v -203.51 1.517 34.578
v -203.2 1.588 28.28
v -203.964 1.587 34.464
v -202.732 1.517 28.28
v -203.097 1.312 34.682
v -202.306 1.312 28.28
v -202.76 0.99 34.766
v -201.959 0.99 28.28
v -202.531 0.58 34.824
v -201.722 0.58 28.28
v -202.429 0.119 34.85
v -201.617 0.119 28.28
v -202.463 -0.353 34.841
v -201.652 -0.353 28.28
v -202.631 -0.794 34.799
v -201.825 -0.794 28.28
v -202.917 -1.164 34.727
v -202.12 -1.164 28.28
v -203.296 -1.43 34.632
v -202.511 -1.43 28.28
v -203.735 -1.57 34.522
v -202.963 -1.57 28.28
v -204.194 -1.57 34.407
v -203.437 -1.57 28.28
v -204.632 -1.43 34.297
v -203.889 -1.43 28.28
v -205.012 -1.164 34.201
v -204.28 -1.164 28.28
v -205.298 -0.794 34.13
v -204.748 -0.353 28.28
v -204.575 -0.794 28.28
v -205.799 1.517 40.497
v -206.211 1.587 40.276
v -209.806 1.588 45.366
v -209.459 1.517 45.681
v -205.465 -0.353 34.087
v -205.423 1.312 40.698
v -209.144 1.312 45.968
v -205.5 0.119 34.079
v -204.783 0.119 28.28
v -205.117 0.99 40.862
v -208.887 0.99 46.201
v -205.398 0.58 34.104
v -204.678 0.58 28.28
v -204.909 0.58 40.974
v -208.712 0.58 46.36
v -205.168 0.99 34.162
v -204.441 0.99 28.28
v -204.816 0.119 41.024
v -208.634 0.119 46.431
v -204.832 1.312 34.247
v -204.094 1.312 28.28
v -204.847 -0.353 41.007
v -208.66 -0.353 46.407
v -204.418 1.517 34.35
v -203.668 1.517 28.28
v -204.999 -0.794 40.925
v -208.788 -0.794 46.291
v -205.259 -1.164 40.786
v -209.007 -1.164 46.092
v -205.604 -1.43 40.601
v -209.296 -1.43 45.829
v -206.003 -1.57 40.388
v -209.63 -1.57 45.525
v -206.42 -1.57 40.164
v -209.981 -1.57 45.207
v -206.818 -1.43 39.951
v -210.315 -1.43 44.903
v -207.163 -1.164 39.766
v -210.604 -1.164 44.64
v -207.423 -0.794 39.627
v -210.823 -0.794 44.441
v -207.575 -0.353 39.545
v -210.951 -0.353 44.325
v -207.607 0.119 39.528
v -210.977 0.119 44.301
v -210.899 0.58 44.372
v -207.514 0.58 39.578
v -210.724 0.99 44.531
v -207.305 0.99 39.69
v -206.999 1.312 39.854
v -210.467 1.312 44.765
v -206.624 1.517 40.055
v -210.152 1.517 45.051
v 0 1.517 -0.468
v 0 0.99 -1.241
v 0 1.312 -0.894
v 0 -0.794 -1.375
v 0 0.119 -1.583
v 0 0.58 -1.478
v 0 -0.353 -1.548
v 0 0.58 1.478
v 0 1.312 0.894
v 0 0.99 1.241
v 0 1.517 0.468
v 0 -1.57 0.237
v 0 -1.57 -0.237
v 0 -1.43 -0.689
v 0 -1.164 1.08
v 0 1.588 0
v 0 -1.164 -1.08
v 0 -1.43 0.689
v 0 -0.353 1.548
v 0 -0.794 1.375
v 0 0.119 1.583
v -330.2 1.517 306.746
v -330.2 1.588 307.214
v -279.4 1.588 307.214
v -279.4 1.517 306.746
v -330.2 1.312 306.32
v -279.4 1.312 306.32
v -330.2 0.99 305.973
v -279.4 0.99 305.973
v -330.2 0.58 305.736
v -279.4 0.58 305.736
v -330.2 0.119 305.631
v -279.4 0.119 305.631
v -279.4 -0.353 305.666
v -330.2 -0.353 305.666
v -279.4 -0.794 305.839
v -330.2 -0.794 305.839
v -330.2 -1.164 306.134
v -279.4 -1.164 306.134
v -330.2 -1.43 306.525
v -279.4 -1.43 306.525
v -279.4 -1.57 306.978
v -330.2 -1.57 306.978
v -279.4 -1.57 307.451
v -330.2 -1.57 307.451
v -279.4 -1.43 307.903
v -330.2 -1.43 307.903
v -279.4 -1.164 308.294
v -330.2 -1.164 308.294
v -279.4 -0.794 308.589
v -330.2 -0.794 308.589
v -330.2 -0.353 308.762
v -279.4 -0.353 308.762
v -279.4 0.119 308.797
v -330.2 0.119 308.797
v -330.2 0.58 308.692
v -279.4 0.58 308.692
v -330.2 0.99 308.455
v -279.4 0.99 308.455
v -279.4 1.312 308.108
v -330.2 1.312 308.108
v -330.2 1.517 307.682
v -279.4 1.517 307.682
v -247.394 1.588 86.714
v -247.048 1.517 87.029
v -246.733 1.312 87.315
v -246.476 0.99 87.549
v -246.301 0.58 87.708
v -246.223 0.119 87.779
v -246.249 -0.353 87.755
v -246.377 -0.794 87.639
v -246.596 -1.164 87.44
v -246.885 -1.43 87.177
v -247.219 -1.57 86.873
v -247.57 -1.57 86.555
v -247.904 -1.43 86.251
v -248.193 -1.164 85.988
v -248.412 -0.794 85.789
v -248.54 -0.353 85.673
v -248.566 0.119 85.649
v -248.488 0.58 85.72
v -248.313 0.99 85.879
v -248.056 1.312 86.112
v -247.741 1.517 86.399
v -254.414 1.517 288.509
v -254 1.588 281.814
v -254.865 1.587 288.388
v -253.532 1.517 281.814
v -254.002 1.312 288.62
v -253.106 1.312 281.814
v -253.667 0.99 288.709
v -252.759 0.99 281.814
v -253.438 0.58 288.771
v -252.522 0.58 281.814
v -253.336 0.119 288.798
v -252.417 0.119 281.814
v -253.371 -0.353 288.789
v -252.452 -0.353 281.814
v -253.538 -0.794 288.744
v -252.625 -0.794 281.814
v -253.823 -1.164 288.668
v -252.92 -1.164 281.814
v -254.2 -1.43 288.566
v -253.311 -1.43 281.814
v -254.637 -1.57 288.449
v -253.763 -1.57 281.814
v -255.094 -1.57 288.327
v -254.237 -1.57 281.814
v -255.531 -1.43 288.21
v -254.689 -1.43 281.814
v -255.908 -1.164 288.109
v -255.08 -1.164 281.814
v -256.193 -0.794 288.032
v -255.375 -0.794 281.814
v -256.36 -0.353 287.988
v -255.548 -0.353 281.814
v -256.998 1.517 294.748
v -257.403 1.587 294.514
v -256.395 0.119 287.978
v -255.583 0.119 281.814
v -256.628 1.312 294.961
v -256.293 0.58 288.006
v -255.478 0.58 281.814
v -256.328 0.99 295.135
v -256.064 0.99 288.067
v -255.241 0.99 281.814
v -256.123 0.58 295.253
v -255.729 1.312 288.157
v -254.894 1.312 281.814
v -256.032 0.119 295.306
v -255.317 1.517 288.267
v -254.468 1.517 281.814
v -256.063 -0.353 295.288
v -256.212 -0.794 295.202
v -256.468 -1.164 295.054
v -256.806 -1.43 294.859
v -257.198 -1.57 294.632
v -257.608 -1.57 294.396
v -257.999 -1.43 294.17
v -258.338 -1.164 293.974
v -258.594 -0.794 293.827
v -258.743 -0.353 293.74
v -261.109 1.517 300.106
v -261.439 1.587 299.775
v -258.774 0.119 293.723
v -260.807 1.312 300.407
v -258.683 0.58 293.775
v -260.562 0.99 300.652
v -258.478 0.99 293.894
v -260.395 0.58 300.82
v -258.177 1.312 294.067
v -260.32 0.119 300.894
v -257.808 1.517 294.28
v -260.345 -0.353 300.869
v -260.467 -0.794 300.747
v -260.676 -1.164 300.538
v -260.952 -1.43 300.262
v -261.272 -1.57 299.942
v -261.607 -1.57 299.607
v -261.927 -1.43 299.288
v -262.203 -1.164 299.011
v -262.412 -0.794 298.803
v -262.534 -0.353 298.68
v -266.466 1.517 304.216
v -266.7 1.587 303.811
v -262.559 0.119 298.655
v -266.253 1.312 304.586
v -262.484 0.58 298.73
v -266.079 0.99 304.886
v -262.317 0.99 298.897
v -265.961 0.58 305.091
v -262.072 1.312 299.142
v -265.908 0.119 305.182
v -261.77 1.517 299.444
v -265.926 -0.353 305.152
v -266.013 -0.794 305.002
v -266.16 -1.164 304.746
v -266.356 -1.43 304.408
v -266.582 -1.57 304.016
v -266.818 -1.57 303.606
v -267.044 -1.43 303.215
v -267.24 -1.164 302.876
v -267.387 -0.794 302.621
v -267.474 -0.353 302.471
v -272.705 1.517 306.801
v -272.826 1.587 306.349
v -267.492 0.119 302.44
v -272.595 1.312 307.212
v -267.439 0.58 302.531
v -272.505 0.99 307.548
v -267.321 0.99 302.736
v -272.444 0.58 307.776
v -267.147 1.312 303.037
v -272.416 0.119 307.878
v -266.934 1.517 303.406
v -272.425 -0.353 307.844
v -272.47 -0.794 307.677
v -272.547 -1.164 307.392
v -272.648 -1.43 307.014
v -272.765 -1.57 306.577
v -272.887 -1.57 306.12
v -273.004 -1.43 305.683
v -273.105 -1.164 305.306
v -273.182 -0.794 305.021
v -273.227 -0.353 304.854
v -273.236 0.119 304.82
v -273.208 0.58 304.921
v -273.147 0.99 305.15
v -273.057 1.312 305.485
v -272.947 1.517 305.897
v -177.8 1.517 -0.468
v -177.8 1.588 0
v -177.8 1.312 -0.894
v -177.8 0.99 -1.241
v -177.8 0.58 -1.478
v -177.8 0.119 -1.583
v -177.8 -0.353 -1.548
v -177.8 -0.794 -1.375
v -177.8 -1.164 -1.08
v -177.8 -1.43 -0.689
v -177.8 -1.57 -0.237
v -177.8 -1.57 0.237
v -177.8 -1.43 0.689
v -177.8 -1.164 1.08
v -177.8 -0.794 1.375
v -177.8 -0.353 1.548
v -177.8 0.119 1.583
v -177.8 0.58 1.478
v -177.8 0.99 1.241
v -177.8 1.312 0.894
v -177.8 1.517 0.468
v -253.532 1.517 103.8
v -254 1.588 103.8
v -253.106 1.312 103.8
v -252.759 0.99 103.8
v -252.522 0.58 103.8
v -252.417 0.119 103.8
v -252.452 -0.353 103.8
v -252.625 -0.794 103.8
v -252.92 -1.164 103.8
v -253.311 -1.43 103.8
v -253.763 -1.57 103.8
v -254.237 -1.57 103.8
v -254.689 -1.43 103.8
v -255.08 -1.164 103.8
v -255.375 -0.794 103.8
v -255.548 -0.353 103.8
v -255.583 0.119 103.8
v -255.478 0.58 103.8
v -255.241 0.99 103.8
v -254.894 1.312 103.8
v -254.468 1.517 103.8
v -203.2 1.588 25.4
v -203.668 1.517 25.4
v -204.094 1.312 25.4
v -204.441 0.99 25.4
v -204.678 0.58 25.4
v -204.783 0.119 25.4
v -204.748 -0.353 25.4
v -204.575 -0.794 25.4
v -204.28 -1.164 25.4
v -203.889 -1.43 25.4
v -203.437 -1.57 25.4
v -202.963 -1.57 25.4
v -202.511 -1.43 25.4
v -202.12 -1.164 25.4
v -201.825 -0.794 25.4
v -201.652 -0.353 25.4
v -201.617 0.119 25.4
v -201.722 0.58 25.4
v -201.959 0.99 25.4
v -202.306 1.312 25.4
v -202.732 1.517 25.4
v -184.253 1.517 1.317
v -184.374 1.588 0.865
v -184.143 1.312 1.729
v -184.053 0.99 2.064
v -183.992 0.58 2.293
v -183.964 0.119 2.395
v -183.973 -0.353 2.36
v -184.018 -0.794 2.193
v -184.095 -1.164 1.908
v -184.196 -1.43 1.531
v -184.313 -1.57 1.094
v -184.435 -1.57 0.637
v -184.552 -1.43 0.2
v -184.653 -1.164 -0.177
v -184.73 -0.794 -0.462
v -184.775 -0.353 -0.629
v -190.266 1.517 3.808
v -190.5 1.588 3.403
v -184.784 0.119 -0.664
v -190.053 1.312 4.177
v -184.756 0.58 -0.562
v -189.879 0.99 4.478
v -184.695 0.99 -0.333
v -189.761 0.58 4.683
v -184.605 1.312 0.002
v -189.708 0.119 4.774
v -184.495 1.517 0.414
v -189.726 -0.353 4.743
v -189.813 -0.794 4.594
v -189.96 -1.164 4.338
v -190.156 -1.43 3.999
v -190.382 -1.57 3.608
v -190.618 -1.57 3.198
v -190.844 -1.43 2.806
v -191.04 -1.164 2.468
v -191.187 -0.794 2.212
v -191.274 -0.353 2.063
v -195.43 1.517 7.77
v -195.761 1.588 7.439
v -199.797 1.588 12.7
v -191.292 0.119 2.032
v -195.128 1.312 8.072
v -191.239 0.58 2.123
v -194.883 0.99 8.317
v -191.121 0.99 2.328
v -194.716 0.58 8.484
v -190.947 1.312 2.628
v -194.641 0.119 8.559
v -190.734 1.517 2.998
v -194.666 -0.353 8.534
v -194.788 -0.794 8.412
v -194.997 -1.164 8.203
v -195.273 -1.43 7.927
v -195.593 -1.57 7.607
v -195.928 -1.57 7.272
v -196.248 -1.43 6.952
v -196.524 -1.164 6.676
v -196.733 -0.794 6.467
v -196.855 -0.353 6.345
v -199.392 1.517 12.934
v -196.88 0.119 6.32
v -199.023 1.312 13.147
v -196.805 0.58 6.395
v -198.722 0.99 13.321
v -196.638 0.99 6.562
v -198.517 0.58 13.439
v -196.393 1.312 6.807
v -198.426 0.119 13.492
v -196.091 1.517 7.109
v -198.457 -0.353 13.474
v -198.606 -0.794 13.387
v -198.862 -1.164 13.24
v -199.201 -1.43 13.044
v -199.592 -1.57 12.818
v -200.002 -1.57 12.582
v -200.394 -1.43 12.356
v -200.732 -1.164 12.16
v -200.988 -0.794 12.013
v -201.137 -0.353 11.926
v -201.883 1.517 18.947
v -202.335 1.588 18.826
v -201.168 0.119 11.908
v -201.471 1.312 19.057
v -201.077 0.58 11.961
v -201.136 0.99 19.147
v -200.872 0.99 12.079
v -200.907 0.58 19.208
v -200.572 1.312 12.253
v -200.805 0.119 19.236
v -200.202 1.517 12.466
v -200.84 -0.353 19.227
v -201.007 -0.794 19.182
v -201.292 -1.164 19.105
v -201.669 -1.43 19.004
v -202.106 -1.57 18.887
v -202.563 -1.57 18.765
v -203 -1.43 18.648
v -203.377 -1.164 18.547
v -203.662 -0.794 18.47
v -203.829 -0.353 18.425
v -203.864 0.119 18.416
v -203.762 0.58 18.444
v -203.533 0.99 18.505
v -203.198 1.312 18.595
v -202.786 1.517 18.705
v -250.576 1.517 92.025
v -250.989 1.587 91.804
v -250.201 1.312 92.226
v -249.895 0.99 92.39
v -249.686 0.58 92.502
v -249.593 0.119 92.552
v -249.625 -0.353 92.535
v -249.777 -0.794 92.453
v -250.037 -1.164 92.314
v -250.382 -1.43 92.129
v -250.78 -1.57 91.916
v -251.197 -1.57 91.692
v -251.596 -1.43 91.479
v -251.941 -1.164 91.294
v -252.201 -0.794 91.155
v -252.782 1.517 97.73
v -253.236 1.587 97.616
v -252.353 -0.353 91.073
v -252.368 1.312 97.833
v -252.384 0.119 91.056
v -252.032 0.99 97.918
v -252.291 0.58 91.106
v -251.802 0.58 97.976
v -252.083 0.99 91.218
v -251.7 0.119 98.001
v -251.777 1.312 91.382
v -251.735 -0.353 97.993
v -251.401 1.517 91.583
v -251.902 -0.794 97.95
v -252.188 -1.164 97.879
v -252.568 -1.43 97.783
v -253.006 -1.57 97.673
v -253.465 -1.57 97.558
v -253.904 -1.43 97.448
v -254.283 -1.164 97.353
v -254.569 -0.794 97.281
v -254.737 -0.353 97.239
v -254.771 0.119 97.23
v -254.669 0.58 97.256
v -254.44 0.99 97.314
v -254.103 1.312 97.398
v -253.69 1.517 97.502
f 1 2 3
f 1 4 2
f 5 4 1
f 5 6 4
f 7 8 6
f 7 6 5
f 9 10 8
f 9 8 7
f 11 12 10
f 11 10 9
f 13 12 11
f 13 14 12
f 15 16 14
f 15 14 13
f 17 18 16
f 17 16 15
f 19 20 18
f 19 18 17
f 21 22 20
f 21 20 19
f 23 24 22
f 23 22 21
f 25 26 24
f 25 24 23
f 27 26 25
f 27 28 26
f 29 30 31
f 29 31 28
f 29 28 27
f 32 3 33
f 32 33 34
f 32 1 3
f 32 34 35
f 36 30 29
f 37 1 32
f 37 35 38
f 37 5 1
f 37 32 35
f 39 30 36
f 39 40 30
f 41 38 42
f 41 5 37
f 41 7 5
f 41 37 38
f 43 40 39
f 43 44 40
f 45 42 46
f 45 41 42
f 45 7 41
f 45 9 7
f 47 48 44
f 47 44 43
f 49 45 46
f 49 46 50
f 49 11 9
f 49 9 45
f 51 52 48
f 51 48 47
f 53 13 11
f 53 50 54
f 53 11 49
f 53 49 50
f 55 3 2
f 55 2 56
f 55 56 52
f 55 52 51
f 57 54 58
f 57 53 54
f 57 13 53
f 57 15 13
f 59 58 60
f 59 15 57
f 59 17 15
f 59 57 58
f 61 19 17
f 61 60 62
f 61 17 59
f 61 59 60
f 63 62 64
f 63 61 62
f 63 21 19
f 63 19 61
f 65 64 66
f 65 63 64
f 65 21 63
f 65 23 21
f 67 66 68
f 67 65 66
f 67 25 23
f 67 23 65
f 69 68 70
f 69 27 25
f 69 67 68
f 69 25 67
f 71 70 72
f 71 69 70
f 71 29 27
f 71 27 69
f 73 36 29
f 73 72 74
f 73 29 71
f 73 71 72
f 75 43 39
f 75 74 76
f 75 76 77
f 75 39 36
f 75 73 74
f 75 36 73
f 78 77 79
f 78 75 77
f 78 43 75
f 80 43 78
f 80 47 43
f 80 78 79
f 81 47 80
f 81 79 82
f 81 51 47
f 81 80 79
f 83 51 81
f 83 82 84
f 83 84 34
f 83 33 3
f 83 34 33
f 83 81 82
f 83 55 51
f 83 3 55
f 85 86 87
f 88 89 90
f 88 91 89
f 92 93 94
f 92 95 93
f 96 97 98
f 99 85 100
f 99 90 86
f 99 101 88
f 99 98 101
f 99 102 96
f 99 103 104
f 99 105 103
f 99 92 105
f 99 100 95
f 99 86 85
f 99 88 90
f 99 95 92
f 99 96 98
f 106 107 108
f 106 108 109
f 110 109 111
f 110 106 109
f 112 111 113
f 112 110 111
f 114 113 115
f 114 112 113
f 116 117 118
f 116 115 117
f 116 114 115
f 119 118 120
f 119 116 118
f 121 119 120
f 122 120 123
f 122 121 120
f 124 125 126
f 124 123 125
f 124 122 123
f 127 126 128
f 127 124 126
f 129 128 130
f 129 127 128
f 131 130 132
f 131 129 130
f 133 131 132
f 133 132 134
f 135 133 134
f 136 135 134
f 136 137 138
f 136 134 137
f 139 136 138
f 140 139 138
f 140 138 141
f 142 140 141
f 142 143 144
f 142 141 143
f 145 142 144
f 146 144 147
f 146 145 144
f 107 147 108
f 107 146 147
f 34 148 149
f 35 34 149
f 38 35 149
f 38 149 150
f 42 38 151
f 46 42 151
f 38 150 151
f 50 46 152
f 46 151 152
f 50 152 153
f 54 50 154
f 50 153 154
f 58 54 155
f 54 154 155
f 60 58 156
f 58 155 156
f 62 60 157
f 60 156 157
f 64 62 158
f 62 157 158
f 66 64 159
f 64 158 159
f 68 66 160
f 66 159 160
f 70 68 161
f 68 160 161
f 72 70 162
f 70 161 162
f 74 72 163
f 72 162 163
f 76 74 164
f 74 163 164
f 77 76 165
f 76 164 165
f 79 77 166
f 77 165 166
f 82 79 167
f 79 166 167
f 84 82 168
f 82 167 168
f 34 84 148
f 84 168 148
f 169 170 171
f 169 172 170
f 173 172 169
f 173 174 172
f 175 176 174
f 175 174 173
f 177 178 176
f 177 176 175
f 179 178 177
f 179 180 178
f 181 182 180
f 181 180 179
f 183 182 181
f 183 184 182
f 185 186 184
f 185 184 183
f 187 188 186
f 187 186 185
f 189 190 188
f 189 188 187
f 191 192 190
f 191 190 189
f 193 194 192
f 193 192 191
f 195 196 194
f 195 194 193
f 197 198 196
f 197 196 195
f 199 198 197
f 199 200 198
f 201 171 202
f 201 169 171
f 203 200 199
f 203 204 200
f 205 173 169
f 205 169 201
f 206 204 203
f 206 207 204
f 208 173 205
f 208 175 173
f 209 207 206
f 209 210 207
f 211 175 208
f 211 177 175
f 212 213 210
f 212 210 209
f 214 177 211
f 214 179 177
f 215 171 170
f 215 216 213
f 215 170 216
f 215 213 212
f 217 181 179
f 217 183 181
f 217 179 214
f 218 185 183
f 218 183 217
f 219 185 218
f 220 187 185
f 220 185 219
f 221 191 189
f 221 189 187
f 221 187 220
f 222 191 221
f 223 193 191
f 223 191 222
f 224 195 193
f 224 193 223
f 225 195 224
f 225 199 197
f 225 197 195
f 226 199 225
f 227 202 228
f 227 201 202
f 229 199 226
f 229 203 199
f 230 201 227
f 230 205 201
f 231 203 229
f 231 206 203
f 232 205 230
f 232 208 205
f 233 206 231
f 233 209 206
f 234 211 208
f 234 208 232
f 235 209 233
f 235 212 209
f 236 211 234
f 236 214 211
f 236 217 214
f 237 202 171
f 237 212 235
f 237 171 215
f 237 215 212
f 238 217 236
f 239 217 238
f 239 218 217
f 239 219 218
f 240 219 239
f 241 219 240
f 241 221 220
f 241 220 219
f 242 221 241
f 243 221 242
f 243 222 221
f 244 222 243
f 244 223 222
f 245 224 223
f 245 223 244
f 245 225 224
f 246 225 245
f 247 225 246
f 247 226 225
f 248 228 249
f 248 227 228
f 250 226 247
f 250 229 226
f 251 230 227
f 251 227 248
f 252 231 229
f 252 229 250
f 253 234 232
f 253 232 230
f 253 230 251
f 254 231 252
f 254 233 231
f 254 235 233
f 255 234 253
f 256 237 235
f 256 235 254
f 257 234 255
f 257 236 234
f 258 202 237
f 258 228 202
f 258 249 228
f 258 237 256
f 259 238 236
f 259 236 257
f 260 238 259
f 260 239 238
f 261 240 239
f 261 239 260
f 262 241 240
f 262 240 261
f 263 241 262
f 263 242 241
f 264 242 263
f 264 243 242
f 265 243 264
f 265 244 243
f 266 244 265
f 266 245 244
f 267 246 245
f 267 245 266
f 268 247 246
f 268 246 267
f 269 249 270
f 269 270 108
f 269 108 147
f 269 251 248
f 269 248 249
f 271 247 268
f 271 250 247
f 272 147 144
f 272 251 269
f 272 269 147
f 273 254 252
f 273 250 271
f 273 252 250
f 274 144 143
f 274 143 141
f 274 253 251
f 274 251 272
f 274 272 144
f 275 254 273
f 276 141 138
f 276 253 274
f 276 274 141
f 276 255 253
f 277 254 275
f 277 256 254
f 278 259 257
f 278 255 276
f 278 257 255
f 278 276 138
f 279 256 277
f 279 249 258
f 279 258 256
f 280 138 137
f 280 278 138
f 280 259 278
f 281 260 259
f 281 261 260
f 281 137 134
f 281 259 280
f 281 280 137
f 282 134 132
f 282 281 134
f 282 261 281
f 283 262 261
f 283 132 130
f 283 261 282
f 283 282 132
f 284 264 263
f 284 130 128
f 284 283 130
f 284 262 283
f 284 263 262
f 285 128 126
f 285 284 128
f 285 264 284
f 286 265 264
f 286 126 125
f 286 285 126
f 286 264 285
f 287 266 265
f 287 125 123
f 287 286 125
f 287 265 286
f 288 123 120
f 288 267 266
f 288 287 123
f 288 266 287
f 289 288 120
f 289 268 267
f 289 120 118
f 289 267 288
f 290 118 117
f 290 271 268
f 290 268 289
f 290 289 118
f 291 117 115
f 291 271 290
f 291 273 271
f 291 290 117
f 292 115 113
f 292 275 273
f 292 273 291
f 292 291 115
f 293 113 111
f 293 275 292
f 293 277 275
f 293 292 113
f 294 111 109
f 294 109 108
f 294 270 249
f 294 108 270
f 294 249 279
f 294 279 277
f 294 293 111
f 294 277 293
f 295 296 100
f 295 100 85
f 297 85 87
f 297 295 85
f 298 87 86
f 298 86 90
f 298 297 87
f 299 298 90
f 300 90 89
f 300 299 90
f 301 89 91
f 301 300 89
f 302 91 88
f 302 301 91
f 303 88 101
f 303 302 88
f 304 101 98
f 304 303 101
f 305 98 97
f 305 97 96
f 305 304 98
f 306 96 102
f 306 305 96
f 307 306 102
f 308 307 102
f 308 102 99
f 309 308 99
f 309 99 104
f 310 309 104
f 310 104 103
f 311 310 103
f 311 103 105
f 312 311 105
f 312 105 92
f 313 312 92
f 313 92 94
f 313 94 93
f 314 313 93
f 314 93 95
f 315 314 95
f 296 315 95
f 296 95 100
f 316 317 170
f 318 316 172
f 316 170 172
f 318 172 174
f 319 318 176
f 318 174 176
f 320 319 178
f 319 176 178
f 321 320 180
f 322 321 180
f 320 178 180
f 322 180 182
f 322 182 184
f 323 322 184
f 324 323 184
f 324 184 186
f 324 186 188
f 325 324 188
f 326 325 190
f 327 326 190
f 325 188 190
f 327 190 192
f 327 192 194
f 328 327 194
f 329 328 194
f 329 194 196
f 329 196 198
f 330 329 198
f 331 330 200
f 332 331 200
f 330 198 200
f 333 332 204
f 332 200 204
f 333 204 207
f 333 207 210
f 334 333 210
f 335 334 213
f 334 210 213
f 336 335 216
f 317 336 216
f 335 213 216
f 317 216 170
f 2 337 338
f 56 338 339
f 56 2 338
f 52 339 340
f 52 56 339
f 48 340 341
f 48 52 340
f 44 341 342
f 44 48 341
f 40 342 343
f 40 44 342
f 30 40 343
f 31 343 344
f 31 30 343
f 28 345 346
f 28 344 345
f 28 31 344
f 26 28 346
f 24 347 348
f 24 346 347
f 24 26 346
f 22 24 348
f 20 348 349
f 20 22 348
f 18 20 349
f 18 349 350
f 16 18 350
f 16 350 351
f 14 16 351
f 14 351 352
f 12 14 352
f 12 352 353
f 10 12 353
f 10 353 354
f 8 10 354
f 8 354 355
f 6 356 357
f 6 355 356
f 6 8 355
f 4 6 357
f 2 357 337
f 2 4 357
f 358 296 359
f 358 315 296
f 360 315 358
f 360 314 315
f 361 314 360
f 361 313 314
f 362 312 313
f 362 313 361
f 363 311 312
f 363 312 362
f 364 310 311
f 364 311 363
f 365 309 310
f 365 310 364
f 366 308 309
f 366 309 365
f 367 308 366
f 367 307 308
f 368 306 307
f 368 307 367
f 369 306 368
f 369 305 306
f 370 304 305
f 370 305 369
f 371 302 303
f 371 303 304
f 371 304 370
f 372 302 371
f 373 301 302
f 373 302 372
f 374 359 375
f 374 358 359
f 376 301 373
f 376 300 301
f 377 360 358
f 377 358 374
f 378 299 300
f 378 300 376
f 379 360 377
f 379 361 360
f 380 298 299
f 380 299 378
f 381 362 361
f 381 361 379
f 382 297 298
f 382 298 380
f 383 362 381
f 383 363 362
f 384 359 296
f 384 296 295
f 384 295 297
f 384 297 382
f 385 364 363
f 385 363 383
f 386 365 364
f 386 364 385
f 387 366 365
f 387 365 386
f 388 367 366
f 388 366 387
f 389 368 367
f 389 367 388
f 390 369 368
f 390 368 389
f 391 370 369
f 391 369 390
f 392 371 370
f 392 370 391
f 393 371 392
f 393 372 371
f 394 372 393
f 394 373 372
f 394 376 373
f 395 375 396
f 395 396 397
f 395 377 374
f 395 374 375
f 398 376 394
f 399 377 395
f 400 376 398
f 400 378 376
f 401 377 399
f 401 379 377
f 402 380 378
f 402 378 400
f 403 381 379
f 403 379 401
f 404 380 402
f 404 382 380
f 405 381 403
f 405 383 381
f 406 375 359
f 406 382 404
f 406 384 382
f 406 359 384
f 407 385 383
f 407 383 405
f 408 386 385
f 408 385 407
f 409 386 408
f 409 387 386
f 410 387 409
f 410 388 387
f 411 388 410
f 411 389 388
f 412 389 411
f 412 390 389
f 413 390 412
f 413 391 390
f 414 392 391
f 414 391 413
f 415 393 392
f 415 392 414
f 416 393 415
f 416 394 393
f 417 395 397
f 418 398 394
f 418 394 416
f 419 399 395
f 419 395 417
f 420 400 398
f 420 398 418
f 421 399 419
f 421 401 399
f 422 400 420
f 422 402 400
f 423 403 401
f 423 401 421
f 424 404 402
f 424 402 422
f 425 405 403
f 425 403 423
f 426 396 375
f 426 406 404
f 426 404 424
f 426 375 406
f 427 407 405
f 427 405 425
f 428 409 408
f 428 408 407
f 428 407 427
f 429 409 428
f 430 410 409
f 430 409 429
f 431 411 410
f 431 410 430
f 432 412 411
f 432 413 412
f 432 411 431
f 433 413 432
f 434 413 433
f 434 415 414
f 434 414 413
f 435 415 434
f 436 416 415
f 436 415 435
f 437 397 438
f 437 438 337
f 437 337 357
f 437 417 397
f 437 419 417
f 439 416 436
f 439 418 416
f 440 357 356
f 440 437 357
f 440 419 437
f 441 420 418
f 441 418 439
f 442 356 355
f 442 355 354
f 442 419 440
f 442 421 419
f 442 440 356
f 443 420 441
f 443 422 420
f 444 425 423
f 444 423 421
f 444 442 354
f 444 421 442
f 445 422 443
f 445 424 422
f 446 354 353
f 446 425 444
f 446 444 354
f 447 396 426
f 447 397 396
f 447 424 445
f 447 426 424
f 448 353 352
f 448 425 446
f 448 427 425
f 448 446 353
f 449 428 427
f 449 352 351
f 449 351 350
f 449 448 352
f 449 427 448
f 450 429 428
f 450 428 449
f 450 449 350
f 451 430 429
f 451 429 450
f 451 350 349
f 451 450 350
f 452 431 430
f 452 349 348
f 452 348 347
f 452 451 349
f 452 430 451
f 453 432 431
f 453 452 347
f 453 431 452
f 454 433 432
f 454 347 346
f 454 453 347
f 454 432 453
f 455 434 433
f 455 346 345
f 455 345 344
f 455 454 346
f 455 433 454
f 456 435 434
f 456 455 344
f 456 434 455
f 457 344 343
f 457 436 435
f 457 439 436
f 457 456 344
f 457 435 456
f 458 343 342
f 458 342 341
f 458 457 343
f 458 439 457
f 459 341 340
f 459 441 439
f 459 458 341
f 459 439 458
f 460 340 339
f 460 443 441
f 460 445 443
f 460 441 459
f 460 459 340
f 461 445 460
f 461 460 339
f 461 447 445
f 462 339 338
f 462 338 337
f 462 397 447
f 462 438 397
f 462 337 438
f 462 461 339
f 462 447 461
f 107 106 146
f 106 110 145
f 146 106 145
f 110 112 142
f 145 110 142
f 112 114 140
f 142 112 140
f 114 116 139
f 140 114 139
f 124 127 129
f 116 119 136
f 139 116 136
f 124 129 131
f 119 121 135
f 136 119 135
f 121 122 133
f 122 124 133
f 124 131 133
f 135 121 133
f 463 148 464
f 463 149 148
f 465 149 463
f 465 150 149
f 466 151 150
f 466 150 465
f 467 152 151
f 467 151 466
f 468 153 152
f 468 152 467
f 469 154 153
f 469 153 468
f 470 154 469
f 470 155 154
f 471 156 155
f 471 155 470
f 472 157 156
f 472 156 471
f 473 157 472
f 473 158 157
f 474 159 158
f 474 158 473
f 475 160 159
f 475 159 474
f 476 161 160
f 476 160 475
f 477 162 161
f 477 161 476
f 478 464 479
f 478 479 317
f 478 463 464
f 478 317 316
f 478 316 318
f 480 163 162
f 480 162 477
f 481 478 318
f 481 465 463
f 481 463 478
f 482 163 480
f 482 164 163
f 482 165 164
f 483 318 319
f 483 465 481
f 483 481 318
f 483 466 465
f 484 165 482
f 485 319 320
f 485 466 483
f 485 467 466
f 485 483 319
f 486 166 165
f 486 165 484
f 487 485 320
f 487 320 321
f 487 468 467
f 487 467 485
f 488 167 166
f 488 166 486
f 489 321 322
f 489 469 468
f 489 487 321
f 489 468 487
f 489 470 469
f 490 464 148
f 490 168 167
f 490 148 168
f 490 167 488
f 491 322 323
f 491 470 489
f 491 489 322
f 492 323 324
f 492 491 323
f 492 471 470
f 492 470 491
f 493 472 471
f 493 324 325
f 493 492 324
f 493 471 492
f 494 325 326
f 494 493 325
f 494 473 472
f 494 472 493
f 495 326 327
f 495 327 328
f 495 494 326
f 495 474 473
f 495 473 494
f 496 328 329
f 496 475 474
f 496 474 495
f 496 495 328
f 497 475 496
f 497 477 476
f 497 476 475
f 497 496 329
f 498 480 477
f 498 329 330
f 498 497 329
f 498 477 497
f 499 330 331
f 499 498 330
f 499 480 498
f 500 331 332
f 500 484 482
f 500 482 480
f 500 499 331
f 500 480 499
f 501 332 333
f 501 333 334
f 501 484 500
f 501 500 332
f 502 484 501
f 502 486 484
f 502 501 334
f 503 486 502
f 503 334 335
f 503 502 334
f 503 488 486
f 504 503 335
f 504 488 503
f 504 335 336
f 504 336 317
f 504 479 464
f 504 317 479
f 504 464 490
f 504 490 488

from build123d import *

# Parameters (mm, degrees)
F1_R = 1.5875


with BuildPart() as f2:
    # F2: sweep along a path in F0
    with BuildLine(Plane.XZ) as f2_path:
        Line((0, 0), (-177.8, 0))
        ThreePointArc((-177.8, 0), (-195.760512, 7.439488), (-203.2, 25.4))
        Line((-203.2, 25.4), (-203.2, 28.280185))
        ThreePointArc((-203.2, 28.280185), (-204.908865, 37.439341), (-209.805522, 45.366074))
        Line((-209.805522, 45.366074), (-247.394478, 86.713926))
        ThreePointArc((-247.394478, 86.713926), (-252.291135, 94.640659), (-254, 103.799815))
        Line((-254, 103.799815), (-254, 281.814138))
        ThreePointArc((-254, 281.814138), (-261.439488, 299.77465), (-279.4, 307.214138))
        Line((-279.4, 307.214138), (-330.2, 307.214138))
    # F1 (on Right) → F2 (sweep)
    with BuildSketch(Plane.YZ):
        Circle(F1_R)
    sweep(path=f2_path.line)


solid = f2.part
